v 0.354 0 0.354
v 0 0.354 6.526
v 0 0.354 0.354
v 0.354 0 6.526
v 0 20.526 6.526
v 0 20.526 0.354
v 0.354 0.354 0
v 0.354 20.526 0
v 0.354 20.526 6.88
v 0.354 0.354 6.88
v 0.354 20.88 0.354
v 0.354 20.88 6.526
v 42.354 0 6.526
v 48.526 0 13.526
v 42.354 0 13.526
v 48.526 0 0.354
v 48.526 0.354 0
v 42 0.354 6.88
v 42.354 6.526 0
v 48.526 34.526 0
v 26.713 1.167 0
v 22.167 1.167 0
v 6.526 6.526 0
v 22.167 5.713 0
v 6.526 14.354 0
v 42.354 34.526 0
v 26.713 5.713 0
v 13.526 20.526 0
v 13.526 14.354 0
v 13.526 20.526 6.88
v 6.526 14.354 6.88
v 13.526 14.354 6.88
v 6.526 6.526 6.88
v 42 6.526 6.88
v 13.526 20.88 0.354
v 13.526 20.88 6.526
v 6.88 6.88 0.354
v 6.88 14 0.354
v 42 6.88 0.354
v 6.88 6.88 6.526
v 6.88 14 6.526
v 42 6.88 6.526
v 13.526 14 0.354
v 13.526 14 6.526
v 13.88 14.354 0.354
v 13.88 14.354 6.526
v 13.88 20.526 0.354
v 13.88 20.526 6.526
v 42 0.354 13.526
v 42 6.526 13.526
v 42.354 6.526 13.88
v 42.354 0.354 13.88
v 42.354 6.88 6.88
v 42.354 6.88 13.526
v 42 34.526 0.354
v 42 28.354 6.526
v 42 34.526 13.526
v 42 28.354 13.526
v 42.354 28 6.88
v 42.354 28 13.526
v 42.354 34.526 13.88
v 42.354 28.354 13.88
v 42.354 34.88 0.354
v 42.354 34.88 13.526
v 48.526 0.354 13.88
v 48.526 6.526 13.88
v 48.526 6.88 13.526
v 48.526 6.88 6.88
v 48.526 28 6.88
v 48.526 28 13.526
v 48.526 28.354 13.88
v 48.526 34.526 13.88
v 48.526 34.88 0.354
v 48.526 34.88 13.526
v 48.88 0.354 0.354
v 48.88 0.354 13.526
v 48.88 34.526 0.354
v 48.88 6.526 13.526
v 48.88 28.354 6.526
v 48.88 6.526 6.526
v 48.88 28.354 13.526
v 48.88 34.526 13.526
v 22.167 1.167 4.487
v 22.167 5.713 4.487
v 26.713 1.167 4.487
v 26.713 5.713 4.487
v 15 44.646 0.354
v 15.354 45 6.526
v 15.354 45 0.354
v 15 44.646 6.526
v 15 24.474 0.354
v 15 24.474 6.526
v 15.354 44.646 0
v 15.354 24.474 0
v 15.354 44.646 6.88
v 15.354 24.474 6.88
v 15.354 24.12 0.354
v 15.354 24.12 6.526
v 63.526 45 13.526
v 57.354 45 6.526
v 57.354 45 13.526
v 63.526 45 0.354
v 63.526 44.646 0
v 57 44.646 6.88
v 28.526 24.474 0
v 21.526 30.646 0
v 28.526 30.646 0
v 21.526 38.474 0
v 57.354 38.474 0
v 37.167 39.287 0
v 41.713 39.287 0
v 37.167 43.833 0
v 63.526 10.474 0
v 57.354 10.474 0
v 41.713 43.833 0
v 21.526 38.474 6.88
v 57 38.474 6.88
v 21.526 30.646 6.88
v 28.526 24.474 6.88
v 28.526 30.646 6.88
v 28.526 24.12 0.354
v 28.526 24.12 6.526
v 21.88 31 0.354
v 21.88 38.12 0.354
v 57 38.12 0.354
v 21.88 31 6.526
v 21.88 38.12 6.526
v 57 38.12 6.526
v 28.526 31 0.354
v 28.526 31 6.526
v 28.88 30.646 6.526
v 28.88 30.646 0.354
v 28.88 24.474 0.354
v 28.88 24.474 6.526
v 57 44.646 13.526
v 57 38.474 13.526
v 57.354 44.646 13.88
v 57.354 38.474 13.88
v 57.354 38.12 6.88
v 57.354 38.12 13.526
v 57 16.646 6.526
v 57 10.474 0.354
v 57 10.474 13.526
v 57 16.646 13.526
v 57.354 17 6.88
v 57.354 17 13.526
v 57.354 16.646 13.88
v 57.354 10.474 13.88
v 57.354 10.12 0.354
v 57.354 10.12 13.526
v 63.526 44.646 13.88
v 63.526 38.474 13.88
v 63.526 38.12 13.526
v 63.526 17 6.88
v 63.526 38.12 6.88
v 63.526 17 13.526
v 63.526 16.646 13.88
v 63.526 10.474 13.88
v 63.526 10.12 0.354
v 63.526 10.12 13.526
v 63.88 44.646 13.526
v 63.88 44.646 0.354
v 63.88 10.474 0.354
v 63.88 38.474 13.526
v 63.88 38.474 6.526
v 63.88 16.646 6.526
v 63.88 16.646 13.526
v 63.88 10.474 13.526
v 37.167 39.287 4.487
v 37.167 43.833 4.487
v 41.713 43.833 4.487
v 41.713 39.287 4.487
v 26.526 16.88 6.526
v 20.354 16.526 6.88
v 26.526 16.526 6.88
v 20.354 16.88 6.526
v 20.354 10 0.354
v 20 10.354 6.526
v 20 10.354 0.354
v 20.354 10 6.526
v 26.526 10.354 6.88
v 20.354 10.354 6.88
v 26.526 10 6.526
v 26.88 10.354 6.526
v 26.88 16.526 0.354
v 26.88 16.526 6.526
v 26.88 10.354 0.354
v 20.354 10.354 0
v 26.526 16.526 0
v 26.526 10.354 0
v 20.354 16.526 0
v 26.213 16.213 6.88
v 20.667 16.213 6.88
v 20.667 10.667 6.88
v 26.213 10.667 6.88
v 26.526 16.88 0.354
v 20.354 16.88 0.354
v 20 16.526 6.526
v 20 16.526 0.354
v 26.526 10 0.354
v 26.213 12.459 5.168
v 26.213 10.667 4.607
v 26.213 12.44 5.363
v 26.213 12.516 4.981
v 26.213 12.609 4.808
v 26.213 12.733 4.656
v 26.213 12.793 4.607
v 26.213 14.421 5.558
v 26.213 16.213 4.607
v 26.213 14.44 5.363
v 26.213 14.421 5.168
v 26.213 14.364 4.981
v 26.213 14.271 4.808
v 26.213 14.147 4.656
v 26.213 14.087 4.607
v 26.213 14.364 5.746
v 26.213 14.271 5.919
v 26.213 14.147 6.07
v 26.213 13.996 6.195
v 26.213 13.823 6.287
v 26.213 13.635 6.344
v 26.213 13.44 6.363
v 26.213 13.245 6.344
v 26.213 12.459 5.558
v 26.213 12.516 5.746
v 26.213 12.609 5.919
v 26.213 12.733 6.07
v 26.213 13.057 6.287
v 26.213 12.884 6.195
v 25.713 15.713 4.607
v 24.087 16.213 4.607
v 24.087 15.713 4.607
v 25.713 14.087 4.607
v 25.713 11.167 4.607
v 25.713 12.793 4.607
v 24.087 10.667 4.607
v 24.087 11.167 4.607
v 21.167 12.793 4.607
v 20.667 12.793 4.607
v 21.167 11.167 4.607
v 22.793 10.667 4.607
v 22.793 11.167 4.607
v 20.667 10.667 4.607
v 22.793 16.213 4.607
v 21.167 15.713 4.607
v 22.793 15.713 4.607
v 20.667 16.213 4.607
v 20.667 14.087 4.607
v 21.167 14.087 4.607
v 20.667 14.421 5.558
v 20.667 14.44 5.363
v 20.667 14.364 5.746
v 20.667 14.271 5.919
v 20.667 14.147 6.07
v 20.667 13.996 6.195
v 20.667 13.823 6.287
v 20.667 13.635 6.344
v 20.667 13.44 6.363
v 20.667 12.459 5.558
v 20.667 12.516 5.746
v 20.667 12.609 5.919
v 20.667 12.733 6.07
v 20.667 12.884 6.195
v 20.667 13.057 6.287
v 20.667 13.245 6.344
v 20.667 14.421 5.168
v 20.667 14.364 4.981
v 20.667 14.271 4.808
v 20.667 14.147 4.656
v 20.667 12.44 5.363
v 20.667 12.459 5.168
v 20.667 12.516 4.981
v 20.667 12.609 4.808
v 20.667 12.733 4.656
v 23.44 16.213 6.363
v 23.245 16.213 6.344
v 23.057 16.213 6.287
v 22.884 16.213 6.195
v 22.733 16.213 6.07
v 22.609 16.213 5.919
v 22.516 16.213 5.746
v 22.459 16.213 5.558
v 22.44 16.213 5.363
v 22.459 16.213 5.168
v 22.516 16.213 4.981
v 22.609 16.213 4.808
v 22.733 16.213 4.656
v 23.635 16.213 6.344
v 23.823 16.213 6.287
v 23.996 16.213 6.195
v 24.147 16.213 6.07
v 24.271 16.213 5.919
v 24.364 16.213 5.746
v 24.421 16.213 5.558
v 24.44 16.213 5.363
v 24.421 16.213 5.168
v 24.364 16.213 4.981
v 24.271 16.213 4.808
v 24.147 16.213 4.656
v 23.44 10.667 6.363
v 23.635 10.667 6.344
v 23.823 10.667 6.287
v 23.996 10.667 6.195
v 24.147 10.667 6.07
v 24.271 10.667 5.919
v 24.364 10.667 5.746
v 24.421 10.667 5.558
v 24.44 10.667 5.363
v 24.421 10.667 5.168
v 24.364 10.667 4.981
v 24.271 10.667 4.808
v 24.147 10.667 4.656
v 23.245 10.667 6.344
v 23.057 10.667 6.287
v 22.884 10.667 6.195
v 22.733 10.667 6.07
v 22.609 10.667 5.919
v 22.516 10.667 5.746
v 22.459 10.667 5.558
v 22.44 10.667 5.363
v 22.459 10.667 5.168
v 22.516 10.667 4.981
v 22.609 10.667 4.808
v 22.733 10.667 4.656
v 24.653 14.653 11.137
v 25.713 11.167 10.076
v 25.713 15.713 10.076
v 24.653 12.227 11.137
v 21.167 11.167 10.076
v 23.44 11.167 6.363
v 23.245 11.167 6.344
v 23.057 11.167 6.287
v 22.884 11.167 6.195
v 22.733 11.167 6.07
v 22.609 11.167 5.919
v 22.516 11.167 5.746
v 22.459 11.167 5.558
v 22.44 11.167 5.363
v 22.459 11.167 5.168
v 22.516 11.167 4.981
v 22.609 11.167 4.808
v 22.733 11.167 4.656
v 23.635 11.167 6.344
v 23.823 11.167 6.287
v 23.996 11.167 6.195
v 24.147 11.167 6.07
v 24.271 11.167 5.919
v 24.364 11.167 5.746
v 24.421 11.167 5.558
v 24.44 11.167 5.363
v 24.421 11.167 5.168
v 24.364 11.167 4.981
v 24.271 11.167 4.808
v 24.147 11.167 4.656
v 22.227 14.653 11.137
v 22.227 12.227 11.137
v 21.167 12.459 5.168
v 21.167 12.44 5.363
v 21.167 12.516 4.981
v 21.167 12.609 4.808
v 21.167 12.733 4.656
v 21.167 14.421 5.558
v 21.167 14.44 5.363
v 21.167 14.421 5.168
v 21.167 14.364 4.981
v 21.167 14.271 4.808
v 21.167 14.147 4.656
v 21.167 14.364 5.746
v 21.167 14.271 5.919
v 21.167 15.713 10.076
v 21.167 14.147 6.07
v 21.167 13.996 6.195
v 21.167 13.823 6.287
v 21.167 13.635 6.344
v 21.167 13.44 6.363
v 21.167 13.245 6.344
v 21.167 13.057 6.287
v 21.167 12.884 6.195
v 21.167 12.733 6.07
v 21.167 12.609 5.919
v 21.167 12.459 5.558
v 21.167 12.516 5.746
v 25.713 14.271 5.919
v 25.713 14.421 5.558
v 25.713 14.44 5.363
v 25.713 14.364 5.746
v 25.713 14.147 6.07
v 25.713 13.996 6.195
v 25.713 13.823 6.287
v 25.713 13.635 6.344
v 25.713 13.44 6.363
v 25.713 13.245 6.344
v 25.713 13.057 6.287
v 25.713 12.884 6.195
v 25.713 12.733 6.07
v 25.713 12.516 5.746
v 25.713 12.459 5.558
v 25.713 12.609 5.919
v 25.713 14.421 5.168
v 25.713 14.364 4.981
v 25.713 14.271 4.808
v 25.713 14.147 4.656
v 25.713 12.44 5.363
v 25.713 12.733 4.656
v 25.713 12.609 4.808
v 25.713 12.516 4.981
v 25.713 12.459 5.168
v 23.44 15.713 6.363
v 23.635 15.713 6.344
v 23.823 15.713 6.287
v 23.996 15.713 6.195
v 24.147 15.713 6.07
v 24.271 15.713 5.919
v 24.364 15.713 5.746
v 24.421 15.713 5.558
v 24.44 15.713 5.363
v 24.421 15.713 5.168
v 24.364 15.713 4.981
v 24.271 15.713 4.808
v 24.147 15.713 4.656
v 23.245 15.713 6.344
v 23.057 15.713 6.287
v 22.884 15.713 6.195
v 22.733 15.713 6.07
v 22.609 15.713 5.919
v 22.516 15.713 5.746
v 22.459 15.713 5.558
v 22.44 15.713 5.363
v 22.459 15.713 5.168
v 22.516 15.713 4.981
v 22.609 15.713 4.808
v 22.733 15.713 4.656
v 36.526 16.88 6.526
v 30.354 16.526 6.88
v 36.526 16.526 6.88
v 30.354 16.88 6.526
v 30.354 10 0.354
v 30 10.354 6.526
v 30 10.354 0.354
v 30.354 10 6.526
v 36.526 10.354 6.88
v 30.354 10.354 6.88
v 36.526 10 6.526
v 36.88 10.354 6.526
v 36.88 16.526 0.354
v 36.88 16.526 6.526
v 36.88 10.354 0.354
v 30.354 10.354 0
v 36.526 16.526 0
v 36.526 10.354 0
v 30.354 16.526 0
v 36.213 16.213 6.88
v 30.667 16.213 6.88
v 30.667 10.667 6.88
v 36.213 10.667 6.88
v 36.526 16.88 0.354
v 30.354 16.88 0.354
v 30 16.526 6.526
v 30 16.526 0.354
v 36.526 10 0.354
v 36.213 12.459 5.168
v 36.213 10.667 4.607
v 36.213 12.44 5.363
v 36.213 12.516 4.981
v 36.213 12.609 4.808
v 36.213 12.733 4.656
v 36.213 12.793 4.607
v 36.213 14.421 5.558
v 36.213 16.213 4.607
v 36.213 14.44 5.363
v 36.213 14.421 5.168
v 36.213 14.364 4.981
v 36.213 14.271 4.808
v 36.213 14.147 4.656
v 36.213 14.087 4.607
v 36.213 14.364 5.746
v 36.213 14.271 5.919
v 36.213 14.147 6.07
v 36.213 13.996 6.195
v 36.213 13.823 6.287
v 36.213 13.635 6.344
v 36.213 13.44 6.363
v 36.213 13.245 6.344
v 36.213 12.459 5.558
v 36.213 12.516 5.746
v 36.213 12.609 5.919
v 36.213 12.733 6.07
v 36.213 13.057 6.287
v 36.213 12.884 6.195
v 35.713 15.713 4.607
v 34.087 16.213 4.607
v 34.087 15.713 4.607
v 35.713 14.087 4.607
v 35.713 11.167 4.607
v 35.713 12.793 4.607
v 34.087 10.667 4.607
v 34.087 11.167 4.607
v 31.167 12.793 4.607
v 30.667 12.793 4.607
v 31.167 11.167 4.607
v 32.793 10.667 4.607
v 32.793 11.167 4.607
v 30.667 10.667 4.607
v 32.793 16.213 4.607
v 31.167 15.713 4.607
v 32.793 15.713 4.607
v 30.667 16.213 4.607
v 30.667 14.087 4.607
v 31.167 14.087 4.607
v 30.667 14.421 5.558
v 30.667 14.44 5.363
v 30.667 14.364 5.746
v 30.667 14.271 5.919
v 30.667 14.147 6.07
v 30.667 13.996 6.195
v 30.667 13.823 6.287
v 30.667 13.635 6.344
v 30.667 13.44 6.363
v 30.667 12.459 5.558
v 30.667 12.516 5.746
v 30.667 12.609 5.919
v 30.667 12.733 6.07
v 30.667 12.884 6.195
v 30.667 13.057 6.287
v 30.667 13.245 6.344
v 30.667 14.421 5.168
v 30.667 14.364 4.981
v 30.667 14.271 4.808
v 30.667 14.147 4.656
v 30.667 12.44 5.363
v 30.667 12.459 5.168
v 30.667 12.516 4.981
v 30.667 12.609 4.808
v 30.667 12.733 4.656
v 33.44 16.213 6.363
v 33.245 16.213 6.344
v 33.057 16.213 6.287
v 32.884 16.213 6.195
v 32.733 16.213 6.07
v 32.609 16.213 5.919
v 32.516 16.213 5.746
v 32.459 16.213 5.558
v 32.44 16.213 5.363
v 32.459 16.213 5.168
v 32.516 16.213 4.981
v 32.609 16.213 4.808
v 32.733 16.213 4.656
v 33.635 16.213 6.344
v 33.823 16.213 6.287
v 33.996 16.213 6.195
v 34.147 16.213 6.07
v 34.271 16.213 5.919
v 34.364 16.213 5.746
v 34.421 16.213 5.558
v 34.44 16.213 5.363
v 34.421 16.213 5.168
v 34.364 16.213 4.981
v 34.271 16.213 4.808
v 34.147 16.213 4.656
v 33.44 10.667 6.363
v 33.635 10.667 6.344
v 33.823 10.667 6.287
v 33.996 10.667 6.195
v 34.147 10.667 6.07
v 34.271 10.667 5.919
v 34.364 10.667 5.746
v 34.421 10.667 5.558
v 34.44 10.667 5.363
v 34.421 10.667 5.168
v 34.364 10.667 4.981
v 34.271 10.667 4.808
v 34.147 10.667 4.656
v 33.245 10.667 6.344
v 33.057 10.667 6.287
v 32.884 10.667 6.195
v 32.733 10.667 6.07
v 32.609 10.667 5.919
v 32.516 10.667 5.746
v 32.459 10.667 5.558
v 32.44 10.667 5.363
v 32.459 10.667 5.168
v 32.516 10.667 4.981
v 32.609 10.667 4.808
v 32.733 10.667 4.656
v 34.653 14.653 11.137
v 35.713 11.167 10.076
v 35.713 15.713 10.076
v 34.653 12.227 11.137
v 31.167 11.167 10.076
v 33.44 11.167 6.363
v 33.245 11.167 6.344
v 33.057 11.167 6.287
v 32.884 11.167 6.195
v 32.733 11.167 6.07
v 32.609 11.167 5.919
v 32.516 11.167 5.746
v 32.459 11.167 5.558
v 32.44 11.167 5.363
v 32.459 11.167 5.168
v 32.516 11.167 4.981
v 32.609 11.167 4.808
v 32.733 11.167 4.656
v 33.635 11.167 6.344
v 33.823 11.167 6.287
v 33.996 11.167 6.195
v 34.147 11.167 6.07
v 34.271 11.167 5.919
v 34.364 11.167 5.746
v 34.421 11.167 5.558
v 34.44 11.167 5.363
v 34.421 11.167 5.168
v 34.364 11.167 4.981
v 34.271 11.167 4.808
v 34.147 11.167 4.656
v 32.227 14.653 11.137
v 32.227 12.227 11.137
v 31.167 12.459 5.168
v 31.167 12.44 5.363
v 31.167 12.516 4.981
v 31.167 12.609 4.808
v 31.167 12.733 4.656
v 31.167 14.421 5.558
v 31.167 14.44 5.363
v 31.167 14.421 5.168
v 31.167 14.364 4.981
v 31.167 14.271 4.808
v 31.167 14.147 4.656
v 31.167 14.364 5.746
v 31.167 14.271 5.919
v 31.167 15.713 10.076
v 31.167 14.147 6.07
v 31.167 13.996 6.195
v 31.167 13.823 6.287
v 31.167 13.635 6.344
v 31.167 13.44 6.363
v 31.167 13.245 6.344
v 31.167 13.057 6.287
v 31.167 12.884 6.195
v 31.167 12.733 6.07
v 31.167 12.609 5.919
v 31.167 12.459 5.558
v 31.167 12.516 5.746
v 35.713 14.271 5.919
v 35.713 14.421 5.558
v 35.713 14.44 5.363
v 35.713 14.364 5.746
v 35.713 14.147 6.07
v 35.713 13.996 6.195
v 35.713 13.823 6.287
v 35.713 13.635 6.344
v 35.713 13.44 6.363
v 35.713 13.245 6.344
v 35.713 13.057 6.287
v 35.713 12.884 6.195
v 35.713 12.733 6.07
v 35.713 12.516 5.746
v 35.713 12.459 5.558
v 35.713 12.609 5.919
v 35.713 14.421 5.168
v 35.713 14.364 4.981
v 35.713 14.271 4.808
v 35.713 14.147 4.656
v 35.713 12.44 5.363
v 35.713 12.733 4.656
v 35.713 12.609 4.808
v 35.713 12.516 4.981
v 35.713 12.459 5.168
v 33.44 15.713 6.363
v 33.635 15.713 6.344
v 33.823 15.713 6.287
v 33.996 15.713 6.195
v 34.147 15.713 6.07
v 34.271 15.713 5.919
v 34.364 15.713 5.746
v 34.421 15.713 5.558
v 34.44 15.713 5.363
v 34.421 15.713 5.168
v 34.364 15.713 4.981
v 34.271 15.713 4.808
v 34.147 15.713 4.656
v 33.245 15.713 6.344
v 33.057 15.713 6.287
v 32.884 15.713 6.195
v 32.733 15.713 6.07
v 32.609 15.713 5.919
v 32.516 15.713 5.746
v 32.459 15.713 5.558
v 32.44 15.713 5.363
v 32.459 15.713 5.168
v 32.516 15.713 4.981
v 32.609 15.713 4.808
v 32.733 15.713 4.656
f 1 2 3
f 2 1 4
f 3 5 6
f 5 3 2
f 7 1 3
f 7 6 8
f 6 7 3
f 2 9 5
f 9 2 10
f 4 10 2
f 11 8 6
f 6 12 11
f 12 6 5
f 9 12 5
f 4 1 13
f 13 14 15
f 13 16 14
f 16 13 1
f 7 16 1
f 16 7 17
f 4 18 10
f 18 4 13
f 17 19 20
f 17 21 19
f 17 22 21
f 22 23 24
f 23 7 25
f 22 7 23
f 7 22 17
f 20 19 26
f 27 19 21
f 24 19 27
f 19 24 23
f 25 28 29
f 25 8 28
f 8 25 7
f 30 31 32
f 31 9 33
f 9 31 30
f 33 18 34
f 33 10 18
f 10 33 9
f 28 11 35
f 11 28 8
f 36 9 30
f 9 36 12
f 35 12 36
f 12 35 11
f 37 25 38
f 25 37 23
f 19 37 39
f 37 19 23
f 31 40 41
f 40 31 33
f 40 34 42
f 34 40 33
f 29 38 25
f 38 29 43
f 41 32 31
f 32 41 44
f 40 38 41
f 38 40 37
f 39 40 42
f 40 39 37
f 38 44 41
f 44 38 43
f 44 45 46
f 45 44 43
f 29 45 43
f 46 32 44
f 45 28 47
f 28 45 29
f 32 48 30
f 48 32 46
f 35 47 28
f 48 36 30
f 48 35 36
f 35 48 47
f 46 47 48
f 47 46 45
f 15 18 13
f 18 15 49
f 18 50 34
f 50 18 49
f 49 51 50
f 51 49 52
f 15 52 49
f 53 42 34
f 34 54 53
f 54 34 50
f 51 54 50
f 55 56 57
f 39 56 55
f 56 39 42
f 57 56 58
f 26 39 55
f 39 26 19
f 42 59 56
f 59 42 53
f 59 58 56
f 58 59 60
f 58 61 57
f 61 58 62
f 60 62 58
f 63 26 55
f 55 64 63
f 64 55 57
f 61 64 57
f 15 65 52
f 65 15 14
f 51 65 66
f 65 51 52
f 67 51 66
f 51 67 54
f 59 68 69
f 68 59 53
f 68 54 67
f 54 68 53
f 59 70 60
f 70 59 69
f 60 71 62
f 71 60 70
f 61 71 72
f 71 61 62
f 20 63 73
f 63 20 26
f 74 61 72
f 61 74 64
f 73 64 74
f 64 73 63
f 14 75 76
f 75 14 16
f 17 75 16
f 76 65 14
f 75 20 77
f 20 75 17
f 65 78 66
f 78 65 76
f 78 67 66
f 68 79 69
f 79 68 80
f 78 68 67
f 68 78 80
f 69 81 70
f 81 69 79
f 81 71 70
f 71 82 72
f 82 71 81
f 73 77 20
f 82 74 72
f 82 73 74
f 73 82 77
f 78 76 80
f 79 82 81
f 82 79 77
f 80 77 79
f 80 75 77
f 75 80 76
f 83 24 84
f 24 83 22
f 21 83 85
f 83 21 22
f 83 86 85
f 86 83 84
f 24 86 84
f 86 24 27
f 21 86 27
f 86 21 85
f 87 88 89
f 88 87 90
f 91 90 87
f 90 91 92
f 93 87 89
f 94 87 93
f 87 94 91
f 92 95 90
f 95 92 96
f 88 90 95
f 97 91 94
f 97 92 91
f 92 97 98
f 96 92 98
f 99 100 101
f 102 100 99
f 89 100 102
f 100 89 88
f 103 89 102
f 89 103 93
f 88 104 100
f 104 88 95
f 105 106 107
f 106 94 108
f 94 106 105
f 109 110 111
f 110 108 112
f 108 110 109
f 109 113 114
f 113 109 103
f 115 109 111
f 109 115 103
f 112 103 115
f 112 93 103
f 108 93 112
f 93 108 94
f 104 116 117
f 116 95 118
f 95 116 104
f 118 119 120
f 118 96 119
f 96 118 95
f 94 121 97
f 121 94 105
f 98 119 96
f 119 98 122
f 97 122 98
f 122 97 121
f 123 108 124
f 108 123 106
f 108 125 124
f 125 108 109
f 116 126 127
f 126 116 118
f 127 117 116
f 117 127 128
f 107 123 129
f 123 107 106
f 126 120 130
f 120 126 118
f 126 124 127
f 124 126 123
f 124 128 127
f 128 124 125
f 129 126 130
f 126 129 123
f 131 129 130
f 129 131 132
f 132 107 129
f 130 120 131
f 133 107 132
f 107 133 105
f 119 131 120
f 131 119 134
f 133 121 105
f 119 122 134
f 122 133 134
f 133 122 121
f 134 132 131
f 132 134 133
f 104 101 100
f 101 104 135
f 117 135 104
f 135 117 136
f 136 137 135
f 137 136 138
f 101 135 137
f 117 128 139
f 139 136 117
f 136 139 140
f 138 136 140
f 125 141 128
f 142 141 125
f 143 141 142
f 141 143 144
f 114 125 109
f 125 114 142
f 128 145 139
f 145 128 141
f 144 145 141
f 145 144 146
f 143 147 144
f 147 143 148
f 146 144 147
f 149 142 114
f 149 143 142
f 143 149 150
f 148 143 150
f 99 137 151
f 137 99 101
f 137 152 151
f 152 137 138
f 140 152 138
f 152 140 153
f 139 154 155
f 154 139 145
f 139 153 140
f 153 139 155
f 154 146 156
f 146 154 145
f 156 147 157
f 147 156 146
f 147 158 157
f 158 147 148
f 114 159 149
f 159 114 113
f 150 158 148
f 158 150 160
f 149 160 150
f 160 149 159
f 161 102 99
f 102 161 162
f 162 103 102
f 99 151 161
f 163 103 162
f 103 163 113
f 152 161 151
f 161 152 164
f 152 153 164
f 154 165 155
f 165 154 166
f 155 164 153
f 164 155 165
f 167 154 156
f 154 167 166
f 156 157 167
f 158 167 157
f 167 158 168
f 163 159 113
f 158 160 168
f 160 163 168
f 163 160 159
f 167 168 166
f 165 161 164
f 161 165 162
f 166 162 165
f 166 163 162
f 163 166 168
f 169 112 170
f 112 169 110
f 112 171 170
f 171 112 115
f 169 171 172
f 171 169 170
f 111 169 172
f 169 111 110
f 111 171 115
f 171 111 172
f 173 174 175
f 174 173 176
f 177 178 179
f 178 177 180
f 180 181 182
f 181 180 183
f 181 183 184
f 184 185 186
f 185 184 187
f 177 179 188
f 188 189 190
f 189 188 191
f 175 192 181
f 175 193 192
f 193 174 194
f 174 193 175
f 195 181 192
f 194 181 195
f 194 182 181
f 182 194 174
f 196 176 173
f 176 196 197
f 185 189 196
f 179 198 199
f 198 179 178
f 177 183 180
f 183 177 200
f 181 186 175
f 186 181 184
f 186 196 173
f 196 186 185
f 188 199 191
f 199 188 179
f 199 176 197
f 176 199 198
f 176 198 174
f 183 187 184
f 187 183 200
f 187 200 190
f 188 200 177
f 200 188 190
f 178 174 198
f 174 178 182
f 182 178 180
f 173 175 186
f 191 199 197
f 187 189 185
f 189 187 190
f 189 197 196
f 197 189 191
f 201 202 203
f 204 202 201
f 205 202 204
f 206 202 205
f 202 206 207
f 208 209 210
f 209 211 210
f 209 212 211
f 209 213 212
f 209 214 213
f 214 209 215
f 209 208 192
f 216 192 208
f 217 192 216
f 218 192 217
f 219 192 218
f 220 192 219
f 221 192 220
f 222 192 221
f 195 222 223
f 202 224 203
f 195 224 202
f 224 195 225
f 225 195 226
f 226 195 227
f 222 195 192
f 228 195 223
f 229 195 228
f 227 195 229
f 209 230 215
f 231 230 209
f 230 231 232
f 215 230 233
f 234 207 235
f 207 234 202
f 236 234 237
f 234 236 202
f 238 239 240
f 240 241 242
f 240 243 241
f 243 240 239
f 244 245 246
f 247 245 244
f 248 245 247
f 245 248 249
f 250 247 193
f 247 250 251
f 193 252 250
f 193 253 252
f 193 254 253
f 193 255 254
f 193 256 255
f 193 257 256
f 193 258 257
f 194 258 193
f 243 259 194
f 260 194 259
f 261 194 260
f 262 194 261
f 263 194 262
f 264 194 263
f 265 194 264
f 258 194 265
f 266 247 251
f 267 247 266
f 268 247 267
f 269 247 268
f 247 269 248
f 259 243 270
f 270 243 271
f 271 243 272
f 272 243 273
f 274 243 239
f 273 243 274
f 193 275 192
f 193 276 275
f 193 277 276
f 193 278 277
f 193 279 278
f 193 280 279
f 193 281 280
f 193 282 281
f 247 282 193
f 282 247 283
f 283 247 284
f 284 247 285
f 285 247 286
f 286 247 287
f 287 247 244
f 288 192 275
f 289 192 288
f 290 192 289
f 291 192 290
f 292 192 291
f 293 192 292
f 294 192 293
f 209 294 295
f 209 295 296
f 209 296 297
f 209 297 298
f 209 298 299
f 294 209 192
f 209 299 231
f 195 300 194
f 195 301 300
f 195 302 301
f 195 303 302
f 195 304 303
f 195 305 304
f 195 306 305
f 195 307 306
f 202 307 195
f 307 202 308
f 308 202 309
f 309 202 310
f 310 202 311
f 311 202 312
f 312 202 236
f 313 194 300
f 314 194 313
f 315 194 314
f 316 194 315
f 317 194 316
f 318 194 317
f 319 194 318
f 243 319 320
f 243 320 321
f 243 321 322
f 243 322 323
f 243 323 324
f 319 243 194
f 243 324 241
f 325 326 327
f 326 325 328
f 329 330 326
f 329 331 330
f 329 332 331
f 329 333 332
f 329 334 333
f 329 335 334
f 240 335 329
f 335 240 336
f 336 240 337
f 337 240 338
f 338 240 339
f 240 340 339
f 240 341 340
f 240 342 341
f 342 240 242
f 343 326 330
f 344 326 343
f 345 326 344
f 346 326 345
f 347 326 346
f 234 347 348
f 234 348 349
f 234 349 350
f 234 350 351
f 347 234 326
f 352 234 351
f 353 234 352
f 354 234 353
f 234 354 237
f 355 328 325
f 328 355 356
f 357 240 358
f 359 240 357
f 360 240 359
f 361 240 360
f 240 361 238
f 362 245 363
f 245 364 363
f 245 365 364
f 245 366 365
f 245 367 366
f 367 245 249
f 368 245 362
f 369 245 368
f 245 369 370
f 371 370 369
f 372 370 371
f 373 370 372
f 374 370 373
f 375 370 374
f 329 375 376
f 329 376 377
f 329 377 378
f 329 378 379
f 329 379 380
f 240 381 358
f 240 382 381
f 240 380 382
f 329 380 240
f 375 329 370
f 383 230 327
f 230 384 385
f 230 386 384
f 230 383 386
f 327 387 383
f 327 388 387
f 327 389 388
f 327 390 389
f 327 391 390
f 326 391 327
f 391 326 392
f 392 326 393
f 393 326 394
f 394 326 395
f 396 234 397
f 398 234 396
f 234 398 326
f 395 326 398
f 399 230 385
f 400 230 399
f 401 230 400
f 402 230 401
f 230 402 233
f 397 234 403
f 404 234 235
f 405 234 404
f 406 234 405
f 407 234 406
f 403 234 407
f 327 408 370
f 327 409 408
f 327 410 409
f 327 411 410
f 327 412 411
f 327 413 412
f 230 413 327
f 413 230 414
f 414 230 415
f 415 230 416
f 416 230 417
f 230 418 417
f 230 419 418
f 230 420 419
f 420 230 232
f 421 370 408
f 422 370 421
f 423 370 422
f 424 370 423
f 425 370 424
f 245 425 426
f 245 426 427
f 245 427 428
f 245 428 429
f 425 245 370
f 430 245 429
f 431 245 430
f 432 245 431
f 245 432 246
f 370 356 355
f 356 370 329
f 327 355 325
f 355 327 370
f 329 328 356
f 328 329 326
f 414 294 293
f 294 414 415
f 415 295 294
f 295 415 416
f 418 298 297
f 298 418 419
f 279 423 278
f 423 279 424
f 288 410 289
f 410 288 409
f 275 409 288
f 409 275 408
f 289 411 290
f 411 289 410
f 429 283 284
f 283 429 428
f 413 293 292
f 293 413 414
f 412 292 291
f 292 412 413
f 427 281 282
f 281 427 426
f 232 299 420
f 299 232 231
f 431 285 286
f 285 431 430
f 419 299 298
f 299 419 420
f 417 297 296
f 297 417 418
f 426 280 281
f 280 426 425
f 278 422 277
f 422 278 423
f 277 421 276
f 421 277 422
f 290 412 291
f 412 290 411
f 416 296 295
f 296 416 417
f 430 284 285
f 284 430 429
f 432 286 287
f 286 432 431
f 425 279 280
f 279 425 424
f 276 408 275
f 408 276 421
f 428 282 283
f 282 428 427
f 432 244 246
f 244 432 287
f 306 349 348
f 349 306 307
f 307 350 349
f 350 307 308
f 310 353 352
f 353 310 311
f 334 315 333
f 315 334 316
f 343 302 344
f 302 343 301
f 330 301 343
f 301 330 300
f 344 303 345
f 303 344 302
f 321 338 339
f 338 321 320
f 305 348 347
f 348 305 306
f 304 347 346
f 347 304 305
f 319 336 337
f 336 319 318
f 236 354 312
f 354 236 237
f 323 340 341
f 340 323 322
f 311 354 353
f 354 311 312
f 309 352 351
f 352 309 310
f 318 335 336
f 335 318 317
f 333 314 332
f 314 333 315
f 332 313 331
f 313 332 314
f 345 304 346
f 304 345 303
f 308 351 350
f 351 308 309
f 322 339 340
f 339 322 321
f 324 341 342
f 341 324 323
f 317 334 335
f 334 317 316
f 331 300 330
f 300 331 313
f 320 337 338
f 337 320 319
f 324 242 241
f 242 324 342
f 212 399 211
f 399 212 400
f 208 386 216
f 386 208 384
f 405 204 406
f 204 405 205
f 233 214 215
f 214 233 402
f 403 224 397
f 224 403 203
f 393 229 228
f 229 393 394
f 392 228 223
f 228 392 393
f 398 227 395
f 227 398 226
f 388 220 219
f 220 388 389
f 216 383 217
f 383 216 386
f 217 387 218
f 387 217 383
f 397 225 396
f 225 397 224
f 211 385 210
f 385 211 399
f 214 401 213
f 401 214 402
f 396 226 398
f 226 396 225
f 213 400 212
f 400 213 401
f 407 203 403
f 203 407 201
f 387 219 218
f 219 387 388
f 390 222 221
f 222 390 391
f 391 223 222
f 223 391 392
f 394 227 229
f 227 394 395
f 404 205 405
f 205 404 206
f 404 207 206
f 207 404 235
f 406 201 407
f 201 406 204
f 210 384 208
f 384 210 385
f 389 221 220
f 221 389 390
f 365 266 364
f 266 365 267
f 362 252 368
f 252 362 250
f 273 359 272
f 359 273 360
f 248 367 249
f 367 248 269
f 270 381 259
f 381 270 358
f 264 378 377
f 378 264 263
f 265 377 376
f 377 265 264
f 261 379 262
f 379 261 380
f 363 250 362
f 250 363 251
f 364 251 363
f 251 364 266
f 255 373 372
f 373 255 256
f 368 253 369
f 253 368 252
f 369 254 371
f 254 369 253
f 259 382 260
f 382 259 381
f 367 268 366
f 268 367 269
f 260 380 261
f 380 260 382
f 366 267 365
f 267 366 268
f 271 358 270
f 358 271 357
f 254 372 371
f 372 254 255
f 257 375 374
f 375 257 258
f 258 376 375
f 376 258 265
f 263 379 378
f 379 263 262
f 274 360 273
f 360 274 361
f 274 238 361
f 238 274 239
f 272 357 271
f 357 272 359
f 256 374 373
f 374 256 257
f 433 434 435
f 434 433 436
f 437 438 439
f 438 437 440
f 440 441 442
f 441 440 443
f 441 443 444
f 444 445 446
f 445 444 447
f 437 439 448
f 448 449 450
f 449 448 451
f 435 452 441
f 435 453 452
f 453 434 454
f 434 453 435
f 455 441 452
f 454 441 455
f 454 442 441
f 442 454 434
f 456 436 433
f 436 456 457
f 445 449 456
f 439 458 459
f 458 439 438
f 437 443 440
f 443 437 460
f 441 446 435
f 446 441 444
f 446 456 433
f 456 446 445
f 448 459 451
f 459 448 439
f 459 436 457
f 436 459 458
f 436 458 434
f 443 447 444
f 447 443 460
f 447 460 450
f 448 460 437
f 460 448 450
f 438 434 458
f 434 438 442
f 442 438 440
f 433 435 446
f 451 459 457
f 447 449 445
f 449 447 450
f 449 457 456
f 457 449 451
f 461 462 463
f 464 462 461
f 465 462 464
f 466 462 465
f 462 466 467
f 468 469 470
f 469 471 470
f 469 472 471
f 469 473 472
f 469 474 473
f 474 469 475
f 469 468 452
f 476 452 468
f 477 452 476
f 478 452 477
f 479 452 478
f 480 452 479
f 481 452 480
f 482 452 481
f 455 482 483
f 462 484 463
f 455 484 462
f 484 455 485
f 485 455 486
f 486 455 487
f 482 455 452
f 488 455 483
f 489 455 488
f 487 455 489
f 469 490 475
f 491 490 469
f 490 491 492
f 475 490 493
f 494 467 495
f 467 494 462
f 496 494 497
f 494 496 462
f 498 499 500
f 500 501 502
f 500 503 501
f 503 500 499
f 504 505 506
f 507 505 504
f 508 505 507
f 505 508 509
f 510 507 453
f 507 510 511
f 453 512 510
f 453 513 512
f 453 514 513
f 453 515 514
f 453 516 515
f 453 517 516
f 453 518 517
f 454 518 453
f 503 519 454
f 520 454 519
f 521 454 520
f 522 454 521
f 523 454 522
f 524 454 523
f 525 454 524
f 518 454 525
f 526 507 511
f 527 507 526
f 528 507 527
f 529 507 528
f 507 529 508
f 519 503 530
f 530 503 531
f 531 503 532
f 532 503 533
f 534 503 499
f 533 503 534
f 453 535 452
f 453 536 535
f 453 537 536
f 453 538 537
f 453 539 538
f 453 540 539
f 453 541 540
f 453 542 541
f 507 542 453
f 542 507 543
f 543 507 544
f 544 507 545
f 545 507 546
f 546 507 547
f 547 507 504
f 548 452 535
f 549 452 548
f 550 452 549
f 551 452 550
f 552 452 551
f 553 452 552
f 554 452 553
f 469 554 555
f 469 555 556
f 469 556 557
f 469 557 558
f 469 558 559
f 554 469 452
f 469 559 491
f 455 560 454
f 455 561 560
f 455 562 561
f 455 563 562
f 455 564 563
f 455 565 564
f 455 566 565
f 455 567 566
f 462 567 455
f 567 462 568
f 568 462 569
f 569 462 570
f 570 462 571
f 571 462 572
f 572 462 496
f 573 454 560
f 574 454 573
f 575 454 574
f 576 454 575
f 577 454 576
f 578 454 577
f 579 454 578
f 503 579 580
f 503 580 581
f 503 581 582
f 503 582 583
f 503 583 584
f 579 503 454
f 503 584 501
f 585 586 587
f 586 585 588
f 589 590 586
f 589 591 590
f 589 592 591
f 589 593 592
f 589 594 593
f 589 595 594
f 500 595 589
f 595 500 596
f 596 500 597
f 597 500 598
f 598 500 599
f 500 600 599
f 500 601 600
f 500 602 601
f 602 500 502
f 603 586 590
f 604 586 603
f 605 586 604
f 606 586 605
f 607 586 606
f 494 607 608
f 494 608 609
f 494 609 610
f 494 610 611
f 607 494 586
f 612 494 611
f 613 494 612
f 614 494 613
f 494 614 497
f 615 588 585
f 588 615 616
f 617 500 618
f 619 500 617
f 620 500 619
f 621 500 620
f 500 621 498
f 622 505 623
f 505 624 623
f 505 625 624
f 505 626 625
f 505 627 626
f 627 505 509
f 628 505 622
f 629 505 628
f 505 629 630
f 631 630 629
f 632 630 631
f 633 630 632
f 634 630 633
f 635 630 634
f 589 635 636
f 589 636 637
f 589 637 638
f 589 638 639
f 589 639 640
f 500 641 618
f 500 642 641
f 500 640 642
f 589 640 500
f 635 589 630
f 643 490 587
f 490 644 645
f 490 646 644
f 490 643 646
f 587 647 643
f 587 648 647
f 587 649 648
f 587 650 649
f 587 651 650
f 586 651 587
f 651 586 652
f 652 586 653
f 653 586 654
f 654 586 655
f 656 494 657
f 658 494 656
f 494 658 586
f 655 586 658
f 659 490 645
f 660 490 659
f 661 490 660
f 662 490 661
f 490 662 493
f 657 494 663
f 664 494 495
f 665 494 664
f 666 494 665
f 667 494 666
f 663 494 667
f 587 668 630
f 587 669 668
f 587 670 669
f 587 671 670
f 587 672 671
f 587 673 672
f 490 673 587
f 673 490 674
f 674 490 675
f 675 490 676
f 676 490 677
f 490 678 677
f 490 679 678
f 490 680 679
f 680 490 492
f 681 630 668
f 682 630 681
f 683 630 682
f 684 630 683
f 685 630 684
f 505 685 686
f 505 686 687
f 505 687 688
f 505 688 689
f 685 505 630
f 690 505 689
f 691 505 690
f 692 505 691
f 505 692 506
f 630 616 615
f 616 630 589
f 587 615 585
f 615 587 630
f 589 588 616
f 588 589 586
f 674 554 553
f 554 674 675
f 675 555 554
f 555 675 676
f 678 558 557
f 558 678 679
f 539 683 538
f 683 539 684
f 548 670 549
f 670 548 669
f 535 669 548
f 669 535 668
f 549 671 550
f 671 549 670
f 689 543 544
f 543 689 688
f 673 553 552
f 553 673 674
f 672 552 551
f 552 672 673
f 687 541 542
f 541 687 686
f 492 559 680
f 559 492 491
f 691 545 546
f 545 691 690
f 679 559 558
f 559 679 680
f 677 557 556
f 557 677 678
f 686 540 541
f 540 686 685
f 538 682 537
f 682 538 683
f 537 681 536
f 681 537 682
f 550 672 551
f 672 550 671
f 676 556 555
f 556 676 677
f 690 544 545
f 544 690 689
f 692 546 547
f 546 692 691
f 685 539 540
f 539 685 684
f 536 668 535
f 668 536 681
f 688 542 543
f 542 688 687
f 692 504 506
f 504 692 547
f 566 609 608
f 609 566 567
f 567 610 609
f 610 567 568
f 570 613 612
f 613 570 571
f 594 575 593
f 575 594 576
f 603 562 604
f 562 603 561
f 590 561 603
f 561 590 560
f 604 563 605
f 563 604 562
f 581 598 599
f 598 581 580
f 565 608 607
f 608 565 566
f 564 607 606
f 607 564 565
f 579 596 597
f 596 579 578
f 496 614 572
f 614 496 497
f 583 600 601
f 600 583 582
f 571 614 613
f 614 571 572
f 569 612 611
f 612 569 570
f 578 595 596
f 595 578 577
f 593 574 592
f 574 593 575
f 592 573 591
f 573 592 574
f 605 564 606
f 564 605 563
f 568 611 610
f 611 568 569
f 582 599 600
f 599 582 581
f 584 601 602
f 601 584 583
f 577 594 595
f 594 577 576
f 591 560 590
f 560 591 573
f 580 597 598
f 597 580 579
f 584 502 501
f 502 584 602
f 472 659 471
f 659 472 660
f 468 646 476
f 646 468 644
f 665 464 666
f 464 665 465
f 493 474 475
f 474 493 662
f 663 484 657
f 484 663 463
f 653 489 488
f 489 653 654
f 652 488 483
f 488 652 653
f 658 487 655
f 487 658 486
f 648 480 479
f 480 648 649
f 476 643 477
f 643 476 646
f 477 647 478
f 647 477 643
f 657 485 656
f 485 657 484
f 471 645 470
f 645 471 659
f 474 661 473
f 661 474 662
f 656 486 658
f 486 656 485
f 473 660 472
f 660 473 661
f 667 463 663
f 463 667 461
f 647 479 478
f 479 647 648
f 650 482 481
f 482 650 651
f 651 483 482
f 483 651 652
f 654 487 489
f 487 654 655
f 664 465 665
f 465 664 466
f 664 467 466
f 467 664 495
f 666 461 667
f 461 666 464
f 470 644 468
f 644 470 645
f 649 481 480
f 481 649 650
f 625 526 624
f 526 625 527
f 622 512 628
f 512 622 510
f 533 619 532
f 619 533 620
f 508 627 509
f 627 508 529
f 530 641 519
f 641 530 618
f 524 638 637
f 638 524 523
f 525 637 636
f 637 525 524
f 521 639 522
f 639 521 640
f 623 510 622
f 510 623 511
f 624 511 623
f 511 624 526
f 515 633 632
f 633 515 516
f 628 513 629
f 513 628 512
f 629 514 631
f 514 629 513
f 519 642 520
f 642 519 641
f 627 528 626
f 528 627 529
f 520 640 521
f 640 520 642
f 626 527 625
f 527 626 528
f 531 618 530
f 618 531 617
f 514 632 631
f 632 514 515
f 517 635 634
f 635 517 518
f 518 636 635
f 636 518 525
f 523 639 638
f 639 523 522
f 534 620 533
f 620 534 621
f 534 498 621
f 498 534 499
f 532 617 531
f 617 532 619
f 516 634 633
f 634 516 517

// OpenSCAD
include <puzzlecad.scad>

union(){
burr_plate([
  [ "xxxx{connect=fz-}xxx|x.....x|xx....x|......x|......x", "......x|.......|.......|.......|......x"]
], $burr_scale = 7, $burr_inset = 0.06, $plate_width = 130);
translate([15,45,0]) rotate([0,0,180]) mirror(v=[1,0,0])
burr_plate([
  [ "xxxx{connect=fz-}xxx|x.....x|xx....x|......x|......x", "......x|.......|.......|.......|......x"]
], $burr_scale = 7, $burr_inset = 0.06, $plate_width = 130);
translate([20,10,0]) burr_plate(["x{connect=mz+}"], $burr_scale = 7, $burr_inset = 0.06, $plate_width = 130);
translate([30,10,0]) burr_plate(["x{connect=mz+}"], $burr_scale = 7, $burr_inset = 0.06, $plate_width = 130);
}
